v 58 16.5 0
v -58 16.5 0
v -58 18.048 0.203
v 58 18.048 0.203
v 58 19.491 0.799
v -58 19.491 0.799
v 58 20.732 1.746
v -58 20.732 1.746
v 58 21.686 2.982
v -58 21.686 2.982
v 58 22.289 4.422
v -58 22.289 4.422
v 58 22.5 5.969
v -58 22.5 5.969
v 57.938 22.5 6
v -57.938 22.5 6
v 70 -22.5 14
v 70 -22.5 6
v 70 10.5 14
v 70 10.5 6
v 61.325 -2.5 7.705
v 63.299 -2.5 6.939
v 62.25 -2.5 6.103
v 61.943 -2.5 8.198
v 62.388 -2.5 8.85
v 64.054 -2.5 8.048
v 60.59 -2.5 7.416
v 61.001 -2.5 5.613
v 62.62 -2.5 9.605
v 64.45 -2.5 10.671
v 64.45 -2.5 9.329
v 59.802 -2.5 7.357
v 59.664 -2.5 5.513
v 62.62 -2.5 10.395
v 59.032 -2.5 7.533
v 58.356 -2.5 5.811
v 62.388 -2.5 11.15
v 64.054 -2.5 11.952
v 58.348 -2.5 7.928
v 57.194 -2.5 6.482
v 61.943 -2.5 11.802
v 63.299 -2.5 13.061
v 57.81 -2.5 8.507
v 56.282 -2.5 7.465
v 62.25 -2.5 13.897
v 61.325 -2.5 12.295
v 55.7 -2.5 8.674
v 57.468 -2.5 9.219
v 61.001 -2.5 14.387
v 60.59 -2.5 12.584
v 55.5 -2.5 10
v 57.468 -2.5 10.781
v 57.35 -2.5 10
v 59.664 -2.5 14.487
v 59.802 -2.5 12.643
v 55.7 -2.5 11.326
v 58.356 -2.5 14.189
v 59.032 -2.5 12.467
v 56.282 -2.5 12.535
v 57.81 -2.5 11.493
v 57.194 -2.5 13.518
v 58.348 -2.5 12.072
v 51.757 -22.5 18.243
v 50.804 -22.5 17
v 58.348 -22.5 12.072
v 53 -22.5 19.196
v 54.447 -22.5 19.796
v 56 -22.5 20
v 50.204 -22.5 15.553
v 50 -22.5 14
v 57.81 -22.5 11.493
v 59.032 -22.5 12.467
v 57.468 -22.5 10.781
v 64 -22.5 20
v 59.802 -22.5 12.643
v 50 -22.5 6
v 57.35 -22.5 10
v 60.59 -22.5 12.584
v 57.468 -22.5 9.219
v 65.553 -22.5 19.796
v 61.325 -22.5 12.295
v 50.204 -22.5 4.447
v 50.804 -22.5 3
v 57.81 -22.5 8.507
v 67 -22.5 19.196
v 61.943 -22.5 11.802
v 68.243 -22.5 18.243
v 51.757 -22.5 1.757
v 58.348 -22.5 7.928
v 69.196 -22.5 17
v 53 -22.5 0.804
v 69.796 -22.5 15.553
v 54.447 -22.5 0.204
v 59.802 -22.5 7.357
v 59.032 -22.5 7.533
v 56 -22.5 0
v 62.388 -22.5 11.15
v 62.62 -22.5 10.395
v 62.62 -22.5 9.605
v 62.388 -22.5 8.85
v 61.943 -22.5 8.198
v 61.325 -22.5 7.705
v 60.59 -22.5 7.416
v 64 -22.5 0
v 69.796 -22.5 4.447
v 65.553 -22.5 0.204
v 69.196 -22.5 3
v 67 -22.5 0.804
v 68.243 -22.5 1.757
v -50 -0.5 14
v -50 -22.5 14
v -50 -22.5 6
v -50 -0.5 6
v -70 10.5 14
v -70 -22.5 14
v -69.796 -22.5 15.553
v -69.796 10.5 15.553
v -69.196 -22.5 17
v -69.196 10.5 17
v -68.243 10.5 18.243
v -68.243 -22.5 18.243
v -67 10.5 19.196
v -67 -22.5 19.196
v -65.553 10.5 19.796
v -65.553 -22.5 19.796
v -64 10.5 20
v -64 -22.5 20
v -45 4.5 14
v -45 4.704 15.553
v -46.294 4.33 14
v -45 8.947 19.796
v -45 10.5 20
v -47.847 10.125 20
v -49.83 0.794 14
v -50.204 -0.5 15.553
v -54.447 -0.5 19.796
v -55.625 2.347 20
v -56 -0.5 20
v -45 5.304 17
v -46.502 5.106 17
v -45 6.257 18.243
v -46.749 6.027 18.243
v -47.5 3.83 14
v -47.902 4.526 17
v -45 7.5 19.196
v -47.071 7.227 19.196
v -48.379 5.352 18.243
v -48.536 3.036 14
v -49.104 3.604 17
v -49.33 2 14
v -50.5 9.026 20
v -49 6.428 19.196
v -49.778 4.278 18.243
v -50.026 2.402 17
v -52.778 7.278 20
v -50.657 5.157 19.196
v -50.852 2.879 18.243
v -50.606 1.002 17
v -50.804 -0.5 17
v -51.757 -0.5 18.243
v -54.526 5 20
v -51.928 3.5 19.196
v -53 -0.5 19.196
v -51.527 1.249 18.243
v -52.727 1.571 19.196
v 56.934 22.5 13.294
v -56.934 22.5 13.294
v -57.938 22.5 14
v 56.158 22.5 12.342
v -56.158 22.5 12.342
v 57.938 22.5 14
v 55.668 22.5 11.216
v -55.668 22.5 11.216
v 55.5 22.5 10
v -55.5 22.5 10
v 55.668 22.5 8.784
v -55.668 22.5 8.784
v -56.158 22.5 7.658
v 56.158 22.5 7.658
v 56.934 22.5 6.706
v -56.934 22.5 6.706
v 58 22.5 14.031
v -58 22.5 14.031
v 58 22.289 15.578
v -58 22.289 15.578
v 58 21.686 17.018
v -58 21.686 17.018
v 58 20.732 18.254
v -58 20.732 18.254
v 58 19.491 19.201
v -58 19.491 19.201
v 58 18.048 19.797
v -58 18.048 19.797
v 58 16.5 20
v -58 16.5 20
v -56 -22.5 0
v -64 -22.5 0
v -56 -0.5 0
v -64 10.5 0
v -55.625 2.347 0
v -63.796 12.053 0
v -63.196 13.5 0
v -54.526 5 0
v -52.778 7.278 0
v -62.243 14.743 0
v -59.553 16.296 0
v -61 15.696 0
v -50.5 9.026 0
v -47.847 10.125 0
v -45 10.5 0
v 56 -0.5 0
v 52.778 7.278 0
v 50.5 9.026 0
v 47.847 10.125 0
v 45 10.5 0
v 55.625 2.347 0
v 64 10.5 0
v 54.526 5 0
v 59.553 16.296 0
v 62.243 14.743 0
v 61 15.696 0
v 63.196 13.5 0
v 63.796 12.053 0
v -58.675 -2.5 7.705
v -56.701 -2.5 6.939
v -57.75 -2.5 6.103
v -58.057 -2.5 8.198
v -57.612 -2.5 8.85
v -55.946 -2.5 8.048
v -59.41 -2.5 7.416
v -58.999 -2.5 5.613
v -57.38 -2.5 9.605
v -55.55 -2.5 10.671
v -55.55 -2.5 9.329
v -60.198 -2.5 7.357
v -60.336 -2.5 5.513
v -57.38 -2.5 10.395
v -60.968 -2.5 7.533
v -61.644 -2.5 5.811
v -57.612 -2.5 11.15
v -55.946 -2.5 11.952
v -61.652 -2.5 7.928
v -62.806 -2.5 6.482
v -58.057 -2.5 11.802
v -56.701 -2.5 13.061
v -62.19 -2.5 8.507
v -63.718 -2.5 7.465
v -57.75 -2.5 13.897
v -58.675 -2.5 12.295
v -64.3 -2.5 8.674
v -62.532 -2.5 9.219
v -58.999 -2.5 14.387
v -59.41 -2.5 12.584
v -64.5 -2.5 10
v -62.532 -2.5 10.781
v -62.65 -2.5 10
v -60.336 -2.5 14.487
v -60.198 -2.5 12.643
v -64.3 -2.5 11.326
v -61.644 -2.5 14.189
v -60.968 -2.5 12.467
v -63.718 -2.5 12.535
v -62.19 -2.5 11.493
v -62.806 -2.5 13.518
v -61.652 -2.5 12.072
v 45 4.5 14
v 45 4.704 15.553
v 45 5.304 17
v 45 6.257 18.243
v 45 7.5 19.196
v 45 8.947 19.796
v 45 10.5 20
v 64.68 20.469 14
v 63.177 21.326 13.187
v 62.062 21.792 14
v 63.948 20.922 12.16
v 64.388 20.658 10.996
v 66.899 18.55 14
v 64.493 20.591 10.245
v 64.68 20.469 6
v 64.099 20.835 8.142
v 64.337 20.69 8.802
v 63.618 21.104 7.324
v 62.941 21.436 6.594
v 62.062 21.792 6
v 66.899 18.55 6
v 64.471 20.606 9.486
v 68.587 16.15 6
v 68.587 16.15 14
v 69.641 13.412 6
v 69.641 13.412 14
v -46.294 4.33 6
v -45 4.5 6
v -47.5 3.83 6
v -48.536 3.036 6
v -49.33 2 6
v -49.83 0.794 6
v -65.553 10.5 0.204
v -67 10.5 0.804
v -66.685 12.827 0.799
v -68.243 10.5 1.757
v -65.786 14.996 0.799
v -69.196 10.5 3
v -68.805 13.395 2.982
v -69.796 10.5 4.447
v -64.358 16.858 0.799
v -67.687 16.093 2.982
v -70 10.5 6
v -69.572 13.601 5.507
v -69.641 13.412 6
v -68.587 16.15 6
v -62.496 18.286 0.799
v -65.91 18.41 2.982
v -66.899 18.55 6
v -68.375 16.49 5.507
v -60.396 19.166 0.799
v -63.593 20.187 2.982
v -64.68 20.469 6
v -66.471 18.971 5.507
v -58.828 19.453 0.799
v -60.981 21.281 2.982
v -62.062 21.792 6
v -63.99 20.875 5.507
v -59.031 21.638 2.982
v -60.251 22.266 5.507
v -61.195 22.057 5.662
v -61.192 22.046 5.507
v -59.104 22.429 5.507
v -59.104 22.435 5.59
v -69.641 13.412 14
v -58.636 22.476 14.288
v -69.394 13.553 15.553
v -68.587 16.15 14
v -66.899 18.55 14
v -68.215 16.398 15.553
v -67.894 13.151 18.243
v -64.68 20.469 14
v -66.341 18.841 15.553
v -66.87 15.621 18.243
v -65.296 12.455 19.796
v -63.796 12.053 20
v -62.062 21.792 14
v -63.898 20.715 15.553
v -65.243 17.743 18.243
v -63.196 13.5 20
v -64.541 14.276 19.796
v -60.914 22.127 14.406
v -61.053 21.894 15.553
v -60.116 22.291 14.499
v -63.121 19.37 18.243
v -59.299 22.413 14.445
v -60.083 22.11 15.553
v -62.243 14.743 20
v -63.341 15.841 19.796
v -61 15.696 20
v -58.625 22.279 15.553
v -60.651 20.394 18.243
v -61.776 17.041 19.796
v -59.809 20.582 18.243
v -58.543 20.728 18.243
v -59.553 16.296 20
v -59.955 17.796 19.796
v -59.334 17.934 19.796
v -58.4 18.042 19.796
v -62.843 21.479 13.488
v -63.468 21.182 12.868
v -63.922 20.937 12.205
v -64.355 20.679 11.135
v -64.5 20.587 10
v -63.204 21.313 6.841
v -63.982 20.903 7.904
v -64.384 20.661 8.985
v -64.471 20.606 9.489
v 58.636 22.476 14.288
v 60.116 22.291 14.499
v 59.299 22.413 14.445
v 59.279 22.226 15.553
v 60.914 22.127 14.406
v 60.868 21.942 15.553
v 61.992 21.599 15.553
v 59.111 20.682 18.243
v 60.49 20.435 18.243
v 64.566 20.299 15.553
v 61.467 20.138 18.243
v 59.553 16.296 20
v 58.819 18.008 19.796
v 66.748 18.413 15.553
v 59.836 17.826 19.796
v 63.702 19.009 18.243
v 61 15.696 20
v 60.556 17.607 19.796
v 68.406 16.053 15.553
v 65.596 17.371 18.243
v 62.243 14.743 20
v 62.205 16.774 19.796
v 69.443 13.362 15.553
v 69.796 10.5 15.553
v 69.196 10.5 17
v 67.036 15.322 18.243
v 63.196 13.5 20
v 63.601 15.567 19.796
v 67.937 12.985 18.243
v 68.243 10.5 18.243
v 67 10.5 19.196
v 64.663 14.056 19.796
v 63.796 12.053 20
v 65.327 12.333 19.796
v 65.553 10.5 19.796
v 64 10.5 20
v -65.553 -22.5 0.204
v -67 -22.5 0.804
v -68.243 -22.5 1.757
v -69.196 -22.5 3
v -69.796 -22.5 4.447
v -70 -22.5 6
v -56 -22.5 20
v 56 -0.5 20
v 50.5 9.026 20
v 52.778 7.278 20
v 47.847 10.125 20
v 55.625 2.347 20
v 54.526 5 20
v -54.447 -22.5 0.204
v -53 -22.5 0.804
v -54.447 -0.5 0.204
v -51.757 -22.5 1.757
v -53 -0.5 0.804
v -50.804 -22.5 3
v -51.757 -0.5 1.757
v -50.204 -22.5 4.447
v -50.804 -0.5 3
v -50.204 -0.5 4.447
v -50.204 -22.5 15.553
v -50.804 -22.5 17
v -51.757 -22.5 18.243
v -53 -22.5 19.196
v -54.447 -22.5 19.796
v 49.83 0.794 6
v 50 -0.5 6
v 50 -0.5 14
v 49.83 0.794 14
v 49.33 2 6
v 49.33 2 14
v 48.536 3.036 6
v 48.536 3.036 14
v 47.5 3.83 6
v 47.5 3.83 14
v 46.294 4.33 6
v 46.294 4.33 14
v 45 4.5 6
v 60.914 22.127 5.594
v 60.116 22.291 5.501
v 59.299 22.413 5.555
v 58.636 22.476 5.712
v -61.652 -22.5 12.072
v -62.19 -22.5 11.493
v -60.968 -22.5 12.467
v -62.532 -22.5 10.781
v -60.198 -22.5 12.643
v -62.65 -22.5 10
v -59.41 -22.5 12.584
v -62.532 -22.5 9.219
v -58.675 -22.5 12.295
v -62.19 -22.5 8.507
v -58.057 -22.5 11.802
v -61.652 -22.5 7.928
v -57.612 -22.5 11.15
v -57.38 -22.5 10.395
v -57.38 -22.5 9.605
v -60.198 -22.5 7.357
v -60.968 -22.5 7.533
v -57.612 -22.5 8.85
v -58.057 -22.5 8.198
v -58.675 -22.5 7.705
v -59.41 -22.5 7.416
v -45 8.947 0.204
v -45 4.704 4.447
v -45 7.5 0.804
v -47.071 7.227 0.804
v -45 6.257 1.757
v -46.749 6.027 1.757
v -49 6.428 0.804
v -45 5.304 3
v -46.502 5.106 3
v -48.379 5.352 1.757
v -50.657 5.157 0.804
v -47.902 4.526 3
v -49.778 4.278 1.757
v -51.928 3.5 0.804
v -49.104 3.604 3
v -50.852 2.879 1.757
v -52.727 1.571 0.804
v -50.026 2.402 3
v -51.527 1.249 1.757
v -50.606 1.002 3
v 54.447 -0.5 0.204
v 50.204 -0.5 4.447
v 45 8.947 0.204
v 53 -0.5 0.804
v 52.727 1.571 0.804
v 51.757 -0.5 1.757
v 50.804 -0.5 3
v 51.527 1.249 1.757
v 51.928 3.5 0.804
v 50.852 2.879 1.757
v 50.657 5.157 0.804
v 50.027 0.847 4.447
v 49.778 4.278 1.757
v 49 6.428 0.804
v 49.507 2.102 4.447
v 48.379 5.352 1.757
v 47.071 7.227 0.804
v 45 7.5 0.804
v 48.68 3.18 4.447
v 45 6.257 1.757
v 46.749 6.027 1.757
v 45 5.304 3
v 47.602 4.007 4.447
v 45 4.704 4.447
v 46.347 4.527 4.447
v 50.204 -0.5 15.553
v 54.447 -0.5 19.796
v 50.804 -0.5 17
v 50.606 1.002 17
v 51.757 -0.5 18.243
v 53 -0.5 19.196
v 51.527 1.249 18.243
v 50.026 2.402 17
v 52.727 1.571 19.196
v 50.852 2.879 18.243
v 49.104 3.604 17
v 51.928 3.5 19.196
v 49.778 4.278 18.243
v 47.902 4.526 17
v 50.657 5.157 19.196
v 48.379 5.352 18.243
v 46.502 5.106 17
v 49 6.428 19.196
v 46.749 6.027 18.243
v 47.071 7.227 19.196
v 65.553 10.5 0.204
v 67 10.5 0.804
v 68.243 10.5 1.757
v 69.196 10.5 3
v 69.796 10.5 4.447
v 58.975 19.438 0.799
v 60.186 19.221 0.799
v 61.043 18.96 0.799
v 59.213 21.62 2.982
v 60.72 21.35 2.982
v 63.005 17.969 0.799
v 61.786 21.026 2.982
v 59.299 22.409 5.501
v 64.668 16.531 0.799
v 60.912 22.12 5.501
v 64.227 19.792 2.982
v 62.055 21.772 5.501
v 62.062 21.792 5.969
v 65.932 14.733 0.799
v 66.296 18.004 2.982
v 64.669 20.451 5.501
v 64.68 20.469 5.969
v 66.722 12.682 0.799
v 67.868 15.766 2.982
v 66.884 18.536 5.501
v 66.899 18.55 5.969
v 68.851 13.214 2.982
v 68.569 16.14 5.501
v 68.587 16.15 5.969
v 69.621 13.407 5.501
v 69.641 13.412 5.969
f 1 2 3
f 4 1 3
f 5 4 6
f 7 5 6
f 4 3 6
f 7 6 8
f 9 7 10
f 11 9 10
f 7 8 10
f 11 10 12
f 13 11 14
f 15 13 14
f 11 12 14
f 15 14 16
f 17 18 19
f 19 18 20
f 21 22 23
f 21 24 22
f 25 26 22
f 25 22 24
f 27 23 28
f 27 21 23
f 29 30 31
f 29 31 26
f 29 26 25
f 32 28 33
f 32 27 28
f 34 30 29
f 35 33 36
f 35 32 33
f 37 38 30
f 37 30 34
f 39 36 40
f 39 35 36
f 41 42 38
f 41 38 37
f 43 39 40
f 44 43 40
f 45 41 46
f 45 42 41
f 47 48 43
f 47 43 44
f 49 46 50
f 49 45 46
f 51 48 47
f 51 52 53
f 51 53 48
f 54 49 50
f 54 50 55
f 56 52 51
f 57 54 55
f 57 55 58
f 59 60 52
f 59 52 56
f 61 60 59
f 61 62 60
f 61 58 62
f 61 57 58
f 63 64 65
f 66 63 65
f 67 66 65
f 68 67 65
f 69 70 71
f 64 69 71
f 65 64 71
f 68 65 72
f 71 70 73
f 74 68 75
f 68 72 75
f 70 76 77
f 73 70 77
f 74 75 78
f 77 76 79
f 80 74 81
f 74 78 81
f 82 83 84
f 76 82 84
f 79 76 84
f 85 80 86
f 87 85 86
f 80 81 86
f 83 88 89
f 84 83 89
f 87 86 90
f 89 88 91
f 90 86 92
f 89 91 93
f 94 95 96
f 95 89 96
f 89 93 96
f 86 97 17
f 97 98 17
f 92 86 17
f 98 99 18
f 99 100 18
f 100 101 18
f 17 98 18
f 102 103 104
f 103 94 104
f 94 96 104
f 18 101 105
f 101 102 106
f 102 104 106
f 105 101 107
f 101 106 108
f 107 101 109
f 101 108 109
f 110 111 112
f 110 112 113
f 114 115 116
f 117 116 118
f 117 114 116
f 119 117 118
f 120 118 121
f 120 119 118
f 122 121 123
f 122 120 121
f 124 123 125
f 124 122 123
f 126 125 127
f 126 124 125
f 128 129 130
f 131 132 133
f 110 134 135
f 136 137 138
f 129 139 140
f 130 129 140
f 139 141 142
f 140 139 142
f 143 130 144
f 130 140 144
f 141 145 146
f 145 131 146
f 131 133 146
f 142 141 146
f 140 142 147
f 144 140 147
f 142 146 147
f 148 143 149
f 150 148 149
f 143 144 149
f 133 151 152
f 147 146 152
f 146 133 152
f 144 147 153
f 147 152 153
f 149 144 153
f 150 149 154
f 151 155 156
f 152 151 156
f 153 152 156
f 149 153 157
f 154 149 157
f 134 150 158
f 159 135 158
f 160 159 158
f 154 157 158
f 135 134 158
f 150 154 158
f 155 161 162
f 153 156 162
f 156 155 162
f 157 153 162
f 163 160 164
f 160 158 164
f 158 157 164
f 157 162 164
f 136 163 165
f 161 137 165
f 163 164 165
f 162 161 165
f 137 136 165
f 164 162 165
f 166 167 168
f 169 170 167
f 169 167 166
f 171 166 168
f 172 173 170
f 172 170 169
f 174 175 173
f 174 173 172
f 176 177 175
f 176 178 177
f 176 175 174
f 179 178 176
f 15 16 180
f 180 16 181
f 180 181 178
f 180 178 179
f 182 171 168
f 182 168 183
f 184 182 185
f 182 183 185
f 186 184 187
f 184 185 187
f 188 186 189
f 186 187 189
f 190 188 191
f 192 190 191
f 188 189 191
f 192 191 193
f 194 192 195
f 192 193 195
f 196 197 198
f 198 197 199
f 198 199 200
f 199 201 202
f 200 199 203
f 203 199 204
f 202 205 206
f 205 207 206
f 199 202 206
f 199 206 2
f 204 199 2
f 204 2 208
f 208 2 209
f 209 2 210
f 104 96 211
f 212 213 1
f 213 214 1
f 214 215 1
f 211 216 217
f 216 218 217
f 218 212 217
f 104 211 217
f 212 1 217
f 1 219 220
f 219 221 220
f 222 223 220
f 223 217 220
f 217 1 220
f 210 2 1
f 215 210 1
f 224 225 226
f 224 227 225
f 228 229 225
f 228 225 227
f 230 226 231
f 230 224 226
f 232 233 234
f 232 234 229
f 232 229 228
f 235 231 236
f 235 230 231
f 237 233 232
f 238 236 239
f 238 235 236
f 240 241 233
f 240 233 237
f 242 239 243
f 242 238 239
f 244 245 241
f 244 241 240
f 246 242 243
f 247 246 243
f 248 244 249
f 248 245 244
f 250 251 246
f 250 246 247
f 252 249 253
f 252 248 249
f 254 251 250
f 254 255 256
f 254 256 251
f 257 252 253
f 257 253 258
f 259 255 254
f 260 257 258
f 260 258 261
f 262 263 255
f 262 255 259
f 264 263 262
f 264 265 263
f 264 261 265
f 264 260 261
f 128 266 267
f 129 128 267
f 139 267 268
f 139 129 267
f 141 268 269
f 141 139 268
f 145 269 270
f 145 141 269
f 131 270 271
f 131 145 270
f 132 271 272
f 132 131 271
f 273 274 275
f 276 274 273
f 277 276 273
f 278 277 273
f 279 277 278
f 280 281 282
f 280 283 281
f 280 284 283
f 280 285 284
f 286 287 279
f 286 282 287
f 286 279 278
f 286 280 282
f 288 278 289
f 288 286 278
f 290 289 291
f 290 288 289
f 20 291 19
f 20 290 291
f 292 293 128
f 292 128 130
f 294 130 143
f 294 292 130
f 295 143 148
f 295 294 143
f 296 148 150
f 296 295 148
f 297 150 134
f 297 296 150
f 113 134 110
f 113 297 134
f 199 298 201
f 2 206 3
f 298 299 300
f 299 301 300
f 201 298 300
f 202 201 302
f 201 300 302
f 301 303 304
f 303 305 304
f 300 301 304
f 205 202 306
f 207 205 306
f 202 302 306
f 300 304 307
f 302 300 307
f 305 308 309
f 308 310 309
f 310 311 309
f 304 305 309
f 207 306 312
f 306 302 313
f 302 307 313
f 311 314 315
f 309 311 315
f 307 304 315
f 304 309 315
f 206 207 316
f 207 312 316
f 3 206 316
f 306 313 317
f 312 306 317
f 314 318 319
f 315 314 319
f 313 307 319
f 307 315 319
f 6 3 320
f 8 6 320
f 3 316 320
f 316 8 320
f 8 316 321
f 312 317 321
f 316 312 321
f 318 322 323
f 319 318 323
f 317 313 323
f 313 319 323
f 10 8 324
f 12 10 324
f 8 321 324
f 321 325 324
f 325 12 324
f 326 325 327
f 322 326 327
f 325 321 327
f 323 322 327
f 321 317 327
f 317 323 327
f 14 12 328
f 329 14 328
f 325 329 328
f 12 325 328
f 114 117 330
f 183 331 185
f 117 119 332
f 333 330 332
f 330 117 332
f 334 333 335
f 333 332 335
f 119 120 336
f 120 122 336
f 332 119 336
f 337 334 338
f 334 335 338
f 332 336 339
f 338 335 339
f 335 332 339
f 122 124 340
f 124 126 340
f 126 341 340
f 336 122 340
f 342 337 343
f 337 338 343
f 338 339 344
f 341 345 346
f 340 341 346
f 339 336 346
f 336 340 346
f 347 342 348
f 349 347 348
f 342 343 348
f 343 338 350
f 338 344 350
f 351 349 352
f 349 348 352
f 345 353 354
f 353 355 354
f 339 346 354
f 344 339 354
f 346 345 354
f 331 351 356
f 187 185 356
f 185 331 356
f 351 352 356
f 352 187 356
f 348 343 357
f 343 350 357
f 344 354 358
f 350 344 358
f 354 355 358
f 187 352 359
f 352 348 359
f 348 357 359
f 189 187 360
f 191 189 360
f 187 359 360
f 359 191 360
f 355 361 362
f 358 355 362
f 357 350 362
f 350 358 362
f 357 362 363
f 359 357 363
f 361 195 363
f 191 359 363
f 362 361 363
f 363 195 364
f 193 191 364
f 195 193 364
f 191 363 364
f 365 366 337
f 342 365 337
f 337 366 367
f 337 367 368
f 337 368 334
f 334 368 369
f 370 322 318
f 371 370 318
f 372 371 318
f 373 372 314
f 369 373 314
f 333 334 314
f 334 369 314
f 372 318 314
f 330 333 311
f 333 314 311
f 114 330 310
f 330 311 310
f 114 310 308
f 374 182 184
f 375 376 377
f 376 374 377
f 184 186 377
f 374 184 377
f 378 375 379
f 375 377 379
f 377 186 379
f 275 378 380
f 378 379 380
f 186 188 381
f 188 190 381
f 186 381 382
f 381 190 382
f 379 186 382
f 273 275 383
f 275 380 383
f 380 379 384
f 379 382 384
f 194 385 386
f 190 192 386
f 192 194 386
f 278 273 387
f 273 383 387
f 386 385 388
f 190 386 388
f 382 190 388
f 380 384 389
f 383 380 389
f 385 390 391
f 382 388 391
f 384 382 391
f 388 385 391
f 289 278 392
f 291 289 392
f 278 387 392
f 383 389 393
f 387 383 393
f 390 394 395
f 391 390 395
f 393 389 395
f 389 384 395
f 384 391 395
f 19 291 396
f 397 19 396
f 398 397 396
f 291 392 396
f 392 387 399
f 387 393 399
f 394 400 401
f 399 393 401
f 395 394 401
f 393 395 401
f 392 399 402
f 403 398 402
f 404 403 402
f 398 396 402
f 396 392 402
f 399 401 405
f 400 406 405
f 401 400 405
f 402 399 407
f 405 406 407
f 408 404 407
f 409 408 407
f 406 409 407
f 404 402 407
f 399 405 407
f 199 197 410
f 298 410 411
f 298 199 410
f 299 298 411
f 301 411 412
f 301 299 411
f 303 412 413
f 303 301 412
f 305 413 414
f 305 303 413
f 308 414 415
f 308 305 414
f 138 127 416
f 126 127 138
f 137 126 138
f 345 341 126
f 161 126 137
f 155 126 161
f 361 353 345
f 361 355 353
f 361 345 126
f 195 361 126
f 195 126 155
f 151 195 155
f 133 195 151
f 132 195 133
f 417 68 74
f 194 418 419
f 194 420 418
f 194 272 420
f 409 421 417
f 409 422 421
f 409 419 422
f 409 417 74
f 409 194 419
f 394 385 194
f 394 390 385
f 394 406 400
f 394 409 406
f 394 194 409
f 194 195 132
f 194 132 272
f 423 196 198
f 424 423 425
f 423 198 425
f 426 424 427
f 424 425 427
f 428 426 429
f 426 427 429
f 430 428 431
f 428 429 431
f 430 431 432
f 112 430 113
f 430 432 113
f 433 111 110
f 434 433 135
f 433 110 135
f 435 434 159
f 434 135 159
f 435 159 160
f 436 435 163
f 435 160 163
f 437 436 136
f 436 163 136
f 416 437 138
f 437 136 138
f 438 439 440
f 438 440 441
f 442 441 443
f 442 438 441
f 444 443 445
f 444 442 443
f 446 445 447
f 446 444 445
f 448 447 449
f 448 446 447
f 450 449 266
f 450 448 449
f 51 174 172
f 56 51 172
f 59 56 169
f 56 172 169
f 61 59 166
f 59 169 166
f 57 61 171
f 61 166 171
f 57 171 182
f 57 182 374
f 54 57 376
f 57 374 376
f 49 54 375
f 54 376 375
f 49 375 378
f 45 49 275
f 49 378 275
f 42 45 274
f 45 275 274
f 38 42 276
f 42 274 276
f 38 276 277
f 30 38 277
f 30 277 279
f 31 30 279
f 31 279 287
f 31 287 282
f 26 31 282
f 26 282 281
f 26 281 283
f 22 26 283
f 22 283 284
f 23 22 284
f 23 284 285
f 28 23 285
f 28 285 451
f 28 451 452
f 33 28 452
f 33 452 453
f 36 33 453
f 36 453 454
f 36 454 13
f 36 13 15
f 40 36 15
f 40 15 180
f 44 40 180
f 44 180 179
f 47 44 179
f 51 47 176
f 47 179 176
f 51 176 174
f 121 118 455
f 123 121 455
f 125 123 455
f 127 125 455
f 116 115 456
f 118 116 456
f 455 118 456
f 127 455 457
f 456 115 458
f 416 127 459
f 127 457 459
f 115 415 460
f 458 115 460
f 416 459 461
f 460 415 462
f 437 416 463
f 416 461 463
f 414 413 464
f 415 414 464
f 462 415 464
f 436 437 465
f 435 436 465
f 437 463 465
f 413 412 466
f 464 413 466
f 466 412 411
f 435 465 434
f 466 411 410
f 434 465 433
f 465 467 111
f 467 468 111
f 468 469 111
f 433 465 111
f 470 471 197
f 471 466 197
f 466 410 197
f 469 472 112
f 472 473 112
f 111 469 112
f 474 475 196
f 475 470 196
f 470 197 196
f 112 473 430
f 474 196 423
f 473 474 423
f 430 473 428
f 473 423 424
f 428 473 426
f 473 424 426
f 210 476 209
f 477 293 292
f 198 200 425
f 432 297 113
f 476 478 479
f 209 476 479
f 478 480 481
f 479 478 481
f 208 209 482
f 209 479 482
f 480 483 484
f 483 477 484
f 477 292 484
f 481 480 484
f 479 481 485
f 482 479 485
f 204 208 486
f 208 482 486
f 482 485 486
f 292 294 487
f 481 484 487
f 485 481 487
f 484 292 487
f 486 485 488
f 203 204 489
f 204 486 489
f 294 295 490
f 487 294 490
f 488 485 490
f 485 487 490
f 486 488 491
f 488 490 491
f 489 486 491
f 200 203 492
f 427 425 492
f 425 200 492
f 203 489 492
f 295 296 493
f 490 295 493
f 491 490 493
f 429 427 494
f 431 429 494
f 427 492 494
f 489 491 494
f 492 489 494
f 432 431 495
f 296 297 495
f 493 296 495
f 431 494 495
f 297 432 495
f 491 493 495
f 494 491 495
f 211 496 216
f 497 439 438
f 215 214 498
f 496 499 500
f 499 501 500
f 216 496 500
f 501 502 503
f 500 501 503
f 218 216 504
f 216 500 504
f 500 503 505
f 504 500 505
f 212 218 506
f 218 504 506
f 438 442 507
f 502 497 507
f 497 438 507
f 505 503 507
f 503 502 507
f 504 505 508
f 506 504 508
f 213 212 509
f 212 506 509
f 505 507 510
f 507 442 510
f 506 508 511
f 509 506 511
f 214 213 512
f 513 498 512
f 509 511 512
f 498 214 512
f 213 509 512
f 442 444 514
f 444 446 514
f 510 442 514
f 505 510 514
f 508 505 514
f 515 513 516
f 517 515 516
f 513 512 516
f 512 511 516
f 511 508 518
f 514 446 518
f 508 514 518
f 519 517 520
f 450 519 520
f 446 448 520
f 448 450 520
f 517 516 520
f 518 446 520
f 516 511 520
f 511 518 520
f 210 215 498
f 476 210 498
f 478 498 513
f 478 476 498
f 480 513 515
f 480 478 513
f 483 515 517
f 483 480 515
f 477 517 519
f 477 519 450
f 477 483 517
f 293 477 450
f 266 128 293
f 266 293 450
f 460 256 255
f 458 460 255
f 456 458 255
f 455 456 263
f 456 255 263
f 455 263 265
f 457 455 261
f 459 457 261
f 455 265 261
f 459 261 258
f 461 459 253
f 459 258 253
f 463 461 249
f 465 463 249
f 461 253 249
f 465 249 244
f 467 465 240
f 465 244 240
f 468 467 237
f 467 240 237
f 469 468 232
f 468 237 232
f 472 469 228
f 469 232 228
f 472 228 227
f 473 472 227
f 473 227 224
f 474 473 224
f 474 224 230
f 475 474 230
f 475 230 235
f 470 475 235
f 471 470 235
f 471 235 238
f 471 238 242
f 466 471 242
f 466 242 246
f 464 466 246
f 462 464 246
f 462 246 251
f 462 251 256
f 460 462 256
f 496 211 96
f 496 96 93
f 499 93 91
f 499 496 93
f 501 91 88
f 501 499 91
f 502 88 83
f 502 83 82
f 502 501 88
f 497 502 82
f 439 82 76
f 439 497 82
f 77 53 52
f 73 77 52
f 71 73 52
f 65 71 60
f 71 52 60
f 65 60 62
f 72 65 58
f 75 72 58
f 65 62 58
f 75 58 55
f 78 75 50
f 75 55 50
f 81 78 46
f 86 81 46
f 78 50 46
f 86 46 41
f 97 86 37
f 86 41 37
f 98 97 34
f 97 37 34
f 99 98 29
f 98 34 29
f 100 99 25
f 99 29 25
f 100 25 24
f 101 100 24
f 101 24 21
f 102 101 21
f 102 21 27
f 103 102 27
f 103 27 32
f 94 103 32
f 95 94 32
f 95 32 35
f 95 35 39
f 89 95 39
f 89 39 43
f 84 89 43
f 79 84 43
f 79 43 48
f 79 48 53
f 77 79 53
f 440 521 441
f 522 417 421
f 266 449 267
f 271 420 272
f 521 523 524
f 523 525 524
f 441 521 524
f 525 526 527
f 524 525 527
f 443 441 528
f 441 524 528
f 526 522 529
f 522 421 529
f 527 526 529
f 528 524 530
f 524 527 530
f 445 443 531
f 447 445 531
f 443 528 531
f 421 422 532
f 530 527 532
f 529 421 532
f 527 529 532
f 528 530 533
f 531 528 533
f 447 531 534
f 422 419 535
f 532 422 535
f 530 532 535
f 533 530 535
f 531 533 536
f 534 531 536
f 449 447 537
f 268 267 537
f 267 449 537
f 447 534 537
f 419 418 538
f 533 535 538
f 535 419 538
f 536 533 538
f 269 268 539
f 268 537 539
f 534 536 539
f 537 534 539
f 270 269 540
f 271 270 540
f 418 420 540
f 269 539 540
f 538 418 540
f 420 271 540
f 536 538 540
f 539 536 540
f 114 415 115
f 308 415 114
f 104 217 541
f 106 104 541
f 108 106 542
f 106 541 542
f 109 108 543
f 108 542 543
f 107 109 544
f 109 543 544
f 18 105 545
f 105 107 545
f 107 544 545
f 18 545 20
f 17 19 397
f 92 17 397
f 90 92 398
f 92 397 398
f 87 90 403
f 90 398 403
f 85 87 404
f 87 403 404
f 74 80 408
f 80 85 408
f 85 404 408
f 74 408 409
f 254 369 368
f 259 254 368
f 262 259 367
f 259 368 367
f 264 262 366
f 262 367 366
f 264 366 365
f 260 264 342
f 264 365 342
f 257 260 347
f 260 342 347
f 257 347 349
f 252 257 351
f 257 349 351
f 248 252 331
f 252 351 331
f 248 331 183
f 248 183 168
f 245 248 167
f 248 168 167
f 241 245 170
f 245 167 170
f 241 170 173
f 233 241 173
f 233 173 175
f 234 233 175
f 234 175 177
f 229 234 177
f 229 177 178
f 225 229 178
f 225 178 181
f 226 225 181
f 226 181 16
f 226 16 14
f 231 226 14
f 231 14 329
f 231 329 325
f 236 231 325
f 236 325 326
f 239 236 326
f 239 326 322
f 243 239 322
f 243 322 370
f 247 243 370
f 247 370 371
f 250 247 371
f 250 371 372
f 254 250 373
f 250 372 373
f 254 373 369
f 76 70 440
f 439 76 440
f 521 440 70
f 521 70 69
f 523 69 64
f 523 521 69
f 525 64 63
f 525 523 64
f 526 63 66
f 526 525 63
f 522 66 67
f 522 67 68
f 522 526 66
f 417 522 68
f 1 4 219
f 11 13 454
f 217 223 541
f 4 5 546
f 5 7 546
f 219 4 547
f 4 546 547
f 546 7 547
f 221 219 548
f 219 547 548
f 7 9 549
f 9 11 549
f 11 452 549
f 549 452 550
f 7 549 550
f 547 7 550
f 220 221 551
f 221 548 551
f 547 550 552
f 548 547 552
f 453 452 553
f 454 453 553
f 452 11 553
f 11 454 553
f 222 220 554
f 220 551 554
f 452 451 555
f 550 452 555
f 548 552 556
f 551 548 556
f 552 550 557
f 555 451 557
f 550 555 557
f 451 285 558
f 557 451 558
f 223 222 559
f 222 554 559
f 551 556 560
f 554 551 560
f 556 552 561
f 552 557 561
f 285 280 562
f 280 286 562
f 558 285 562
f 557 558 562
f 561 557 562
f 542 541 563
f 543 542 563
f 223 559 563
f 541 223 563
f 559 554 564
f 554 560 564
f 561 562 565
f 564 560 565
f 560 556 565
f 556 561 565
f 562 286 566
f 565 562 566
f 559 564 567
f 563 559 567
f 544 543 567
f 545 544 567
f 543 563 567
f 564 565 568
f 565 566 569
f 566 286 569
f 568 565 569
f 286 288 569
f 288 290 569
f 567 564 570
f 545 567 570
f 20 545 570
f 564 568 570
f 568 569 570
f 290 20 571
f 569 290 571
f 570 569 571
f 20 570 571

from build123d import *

# Parameters (mm, degrees)
F0_W          = 140
F0_H          = 45
F1_DEPTH      = 20
F2_W          = 100
F2_H          = 27
F3_DEPTH      = 25
F4_R          = 2.65
F5_DEPTH      = 45.001
F6_R          = 4.5
F7_DEPTH      = 25
F8_T1_DEPTH   = 80
F9_R          = 5
F10_T1_DEPTH  = 116
F10_T3_DEPTH  = 90
F10_T5_DEPTH  = 37
F10_T7_DEPTH  = 48
F10_T10_ANGLE = 90
F10_T12_ANGLE = 90
F10_T14_ANGLE = 89.9999999987
F10_T16_ANGLE = 89.9999999987
F10_T18_ANGLE = 90
F10_T20_ANGLE = 90
F10_T22_ANGLE = 89.9999999987
F10_T24_ANGLE = 89.9999999987


# Not quite as in the source:
# - a fillet or chamfer that OpenCascade refuses, or shapes differently, is made with other operations: its cross-section is extruded or revolved along the edge and cut away or added


with BuildPart() as f1:
    # F0 (on Top) → F1 (new body)
    with BuildSketch(Plane.XY):
        Rectangle(F0_W, F0_H)
    extrude(amount=F1_DEPTH)

    # F2 (on face) → F3 (cut)
    with BuildSketch(Plane.XY.offset(20)):
        with Locations((0, -9)):
            Rectangle(F2_W, F2_H)
    extrude(amount=-F3_DEPTH, mode=Mode.SUBTRACT)

    # F4 (on face) → F5 (cut, through all)
    with BuildSketch(Plane(origin=(0, 22.5, 0), x_dir=(-1, 0, 0), z_dir=(0, 1, 0))):
        with Locations((60, 10)):
            Circle(F4_R)
        with Locations((-60, 10)):
            Circle(F4_R)
    extrude(amount=-F5_DEPTH, mode=Mode.SUBTRACT)

    # F6 (on face) → F7 (cut)
    with BuildSketch(Plane(origin=(0, 22.5, 0), x_dir=(-1, 0, 0), z_dir=(0, 1, 0))):
        with Locations((60, 10)):
            Circle(F6_R)
        with Locations((-60, 10)):
            Circle(F6_R)
    extrude(amount=-F7_DEPTH, mode=Mode.SUBTRACT)

    # F8: fillet of radius 12 on 2 edges, made by hand

    # F8_s2 → F8_t1 (cut)
    with BuildSketch(Plane.XY.offset(-30)):
        with BuildLine():
            ThreePointArc((-58, 22.5), (-66.4852813742, 18.9852813742), (-70, 10.5))
            Line((-70, 10.5), (-70, 22.5))
            Line((-70, 22.5), (-58, 22.5))
        make_face()
        with BuildLine():
            ThreePointArc((58, 22.5), (66.4852813742, 18.9852813742), (70, 10.5))
            Line((70, 10.5), (70, 22.5))
            Line((70, 22.5), (58, 22.5))
        make_face()
    extrude(amount=F8_T1_DEPTH, mode=Mode.SUBTRACT)

    # F9
    f9_edges = [f1.edges().sort_by_distance(p)[0] for p in [
        (-50, 4.5, 10),
        (50, 4.5, 10),
    ]]
    fillet(f9_edges, radius=F9_R)

    # F10: fillet of radius 6 on 20 edges, made by hand

    # F10_s2 → F10_t1 (cut)
    with BuildSketch(Plane.YZ.offset(-58)):
        with BuildLine():
            ThreePointArc((22.5, 14), (20.7426406871, 18.2426406871), (16.5, 20))
            Line((16.5, 20), (22.5, 20))
            Line((22.5, 20), (22.5, 14))
        make_face()
        with BuildLine():
            ThreePointArc((16.5, 0), (20.7426406871, 1.7573593129), (22.5, 6))
            Line((22.5, 6), (22.5, 0))
            Line((22.5, 0), (16.5, 0))
        make_face()
    extrude(amount=F10_T1_DEPTH, mode=Mode.SUBTRACT)

    # F10_s4 → F10_t3 (cut)
    with BuildSketch(Plane.YZ.offset(-45)):
        with BuildLine():
            ThreePointArc((4.5, 14), (6.2573593129, 18.2426406871), (10.5, 20))
            Line((10.5, 20), (4.5, 20))
            Line((4.5, 20), (4.5, 14))
        make_face()
        with BuildLine():
            ThreePointArc((10.5, 0), (6.2573593129, 1.7573593129), (4.5, 6))
            Line((4.5, 6), (4.5, 0))
            Line((4.5, 0), (10.5, 0))
        make_face()
    extrude(amount=F10_T3_DEPTH, mode=Mode.SUBTRACT)

    # F10_s6 → F10_t5 (cut)
    with BuildSketch(Plane.XZ.offset(0.5)):
        with BuildLine():
            ThreePointArc((56, 0), (51.7573593129, 1.7573593129), (50, 6))
            Line((50, 6), (50, 0))
            Line((50, 0), (56, 0))
        make_face()
        with BuildLine():
            ThreePointArc((-56, 0), (-51.7573593129, 1.7573593129), (-50, 6))
            Line((-50, 6), (-50, 0))
            Line((-50, 0), (-56, 0))
        make_face()
        with BuildLine():
            ThreePointArc((50, 14), (51.7573593129, 18.2426406871), (56, 20))
            Line((56, 20), (50, 20))
            Line((50, 20), (50, 14))
        make_face()
        with BuildLine():
            ThreePointArc((-50, 14), (-51.7573593129, 18.2426406871), (-56, 20))
            Line((-56, 20), (-50, 20))
            Line((-50, 20), (-50, 14))
        make_face()
    extrude(amount=F10_T5_DEPTH, mode=Mode.SUBTRACT)

    # F10_s8 → F10_t7 (cut)
    with BuildSketch(Plane.XZ.offset(-10.5)):
        with BuildLine():
            ThreePointArc((64, 0), (68.2426406871, 1.7573593129), (70, 6))
            Line((70, 6), (70, 0))
            Line((70, 0), (64, 0))
        make_face()
        with BuildLine():
            ThreePointArc((-64, 0), (-68.2426406871, 1.7573593129), (-70, 6))
            Line((-70, 6), (-70, 0))
            Line((-70, 0), (-64, 0))
        make_face()
        with BuildLine():
            ThreePointArc((70, 14), (68.2426406871, 18.2426406871), (64, 20))
            Line((64, 20), (70, 20))
            Line((70, 20), (70, 14))
        make_face()
        with BuildLine():
            ThreePointArc((-70, 14), (-68.2426406871, 18.2426406871), (-64, 20))
            Line((-64, 20), (-70, 20))
            Line((-70, 20), (-70, 14))
        make_face()
    extrude(amount=F10_T7_DEPTH, mode=Mode.SUBTRACT)

    # F10_s9 → F10_t10 (revolve, cut)
    with BuildSketch(Plane.XZ.offset(0.5)):
        with BuildLine():
            ThreePointArc((56, 0), (51.7573593129, 1.7573593129), (50, 6))
            Line((50, 6), (50, 0))
            Line((50, 0), (56, 0))
        make_face()
    revolve(axis=Axis((45, -0.5, 0), (0, 0, 1)), revolution_arc=F10_T10_ANGLE, mode=Mode.SUBTRACT)

    # F10_s11 → F10_t12 (revolve, cut)
    with BuildSketch(Plane.YZ.offset(-45)):
        with BuildLine():
            ThreePointArc((10.5, 0), (6.2573593129, 1.7573593129), (4.5, 6))
            Line((4.5, 6), (4.5, 0))
            Line((4.5, 0), (10.5, 0))
        make_face()
    revolve(axis=Axis((-45, -0.5, 0), (0, 0, 1)), revolution_arc=F10_T12_ANGLE, mode=Mode.SUBTRACT)

    # F10_s13 → F10_t14 (revolve, cut)
    with BuildSketch(Plane.YZ.offset(57.9999999999)):
        with BuildLine():
            ThreePointArc((16.5, 0), (20.7426406871, 1.7573593129), (22.5, 6))
            Line((22.5, 6), (22.5, 0))
            Line((22.5, 0), (16.5, 0))
        make_face()
    revolve(axis=Axis((57.9999999999, 10.4999999999, 0), (0, 0, -1)), revolution_arc=F10_T14_ANGLE, mode=Mode.SUBTRACT)

    # F10_s15 → F10_t16 (revolve, cut)
    with BuildSketch(Plane.XZ.offset(-10.4999999999)):
        with BuildLine():
            ThreePointArc((-64, 0), (-68.2426406871, 1.7573593129), (-70, 6))
            Line((-70, 6), (-70, 0))
            Line((-70, 0), (-64, 0))
        make_face()
    revolve(axis=Axis((-57.9999999999, 10.4999999999, 0), (0, 0, -1)), revolution_arc=F10_T16_ANGLE, mode=Mode.SUBTRACT)

    # F10_s17 → F10_t18 (revolve, cut)
    with BuildSketch(Plane.XZ.offset(0.5)):
        with BuildLine():
            ThreePointArc((50, 14), (51.7573593129, 18.2426406871), (56, 20))
            Line((56, 20), (50, 20))
            Line((50, 20), (50, 14))
        make_face()
    revolve(axis=Axis((45, -0.5, 20), (0, 0, 1)), revolution_arc=F10_T18_ANGLE, mode=Mode.SUBTRACT)

    # F10_s19 → F10_t20 (revolve, cut)
    with BuildSketch(Plane.YZ.offset(-45)):
        with BuildLine():
            ThreePointArc((4.5, 14), (6.2573593129, 18.2426406871), (10.5, 20))
            Line((10.5, 20), (4.5, 20))
            Line((4.5, 20), (4.5, 14))
        make_face()
    revolve(axis=Axis((-45, -0.5, 20), (0, 0, 1)), revolution_arc=F10_T20_ANGLE, mode=Mode.SUBTRACT)

    # F10_s21 → F10_t22 (revolve, cut)
    with BuildSketch(Plane.YZ.offset(57.9999999999)):
        with BuildLine():
            ThreePointArc((22.5, 14), (20.7426406871, 18.2426406871), (16.5, 20))
            Line((16.5, 20), (22.5, 20))
            Line((22.5, 20), (22.5, 14))
        make_face()
    revolve(axis=Axis((57.9999999999, 10.4999999999, 20), (0, 0, -1)), revolution_arc=F10_T22_ANGLE, mode=Mode.SUBTRACT)

    # F10_s23 → F10_t24 (revolve, cut)
    with BuildSketch(Plane.XZ.offset(-10.4999999999)):
        with BuildLine():
            ThreePointArc((-70, 14), (-68.2426406871, 18.2426406871), (-64, 20))
            Line((-64, 20), (-70, 20))
            Line((-70, 20), (-70, 14))
        make_face()
    revolve(axis=Axis((-57.9999999999, 10.4999999999, 20), (0, 0, -1)), revolution_arc=F10_T24_ANGLE, mode=Mode.SUBTRACT)


solid = f1.part
